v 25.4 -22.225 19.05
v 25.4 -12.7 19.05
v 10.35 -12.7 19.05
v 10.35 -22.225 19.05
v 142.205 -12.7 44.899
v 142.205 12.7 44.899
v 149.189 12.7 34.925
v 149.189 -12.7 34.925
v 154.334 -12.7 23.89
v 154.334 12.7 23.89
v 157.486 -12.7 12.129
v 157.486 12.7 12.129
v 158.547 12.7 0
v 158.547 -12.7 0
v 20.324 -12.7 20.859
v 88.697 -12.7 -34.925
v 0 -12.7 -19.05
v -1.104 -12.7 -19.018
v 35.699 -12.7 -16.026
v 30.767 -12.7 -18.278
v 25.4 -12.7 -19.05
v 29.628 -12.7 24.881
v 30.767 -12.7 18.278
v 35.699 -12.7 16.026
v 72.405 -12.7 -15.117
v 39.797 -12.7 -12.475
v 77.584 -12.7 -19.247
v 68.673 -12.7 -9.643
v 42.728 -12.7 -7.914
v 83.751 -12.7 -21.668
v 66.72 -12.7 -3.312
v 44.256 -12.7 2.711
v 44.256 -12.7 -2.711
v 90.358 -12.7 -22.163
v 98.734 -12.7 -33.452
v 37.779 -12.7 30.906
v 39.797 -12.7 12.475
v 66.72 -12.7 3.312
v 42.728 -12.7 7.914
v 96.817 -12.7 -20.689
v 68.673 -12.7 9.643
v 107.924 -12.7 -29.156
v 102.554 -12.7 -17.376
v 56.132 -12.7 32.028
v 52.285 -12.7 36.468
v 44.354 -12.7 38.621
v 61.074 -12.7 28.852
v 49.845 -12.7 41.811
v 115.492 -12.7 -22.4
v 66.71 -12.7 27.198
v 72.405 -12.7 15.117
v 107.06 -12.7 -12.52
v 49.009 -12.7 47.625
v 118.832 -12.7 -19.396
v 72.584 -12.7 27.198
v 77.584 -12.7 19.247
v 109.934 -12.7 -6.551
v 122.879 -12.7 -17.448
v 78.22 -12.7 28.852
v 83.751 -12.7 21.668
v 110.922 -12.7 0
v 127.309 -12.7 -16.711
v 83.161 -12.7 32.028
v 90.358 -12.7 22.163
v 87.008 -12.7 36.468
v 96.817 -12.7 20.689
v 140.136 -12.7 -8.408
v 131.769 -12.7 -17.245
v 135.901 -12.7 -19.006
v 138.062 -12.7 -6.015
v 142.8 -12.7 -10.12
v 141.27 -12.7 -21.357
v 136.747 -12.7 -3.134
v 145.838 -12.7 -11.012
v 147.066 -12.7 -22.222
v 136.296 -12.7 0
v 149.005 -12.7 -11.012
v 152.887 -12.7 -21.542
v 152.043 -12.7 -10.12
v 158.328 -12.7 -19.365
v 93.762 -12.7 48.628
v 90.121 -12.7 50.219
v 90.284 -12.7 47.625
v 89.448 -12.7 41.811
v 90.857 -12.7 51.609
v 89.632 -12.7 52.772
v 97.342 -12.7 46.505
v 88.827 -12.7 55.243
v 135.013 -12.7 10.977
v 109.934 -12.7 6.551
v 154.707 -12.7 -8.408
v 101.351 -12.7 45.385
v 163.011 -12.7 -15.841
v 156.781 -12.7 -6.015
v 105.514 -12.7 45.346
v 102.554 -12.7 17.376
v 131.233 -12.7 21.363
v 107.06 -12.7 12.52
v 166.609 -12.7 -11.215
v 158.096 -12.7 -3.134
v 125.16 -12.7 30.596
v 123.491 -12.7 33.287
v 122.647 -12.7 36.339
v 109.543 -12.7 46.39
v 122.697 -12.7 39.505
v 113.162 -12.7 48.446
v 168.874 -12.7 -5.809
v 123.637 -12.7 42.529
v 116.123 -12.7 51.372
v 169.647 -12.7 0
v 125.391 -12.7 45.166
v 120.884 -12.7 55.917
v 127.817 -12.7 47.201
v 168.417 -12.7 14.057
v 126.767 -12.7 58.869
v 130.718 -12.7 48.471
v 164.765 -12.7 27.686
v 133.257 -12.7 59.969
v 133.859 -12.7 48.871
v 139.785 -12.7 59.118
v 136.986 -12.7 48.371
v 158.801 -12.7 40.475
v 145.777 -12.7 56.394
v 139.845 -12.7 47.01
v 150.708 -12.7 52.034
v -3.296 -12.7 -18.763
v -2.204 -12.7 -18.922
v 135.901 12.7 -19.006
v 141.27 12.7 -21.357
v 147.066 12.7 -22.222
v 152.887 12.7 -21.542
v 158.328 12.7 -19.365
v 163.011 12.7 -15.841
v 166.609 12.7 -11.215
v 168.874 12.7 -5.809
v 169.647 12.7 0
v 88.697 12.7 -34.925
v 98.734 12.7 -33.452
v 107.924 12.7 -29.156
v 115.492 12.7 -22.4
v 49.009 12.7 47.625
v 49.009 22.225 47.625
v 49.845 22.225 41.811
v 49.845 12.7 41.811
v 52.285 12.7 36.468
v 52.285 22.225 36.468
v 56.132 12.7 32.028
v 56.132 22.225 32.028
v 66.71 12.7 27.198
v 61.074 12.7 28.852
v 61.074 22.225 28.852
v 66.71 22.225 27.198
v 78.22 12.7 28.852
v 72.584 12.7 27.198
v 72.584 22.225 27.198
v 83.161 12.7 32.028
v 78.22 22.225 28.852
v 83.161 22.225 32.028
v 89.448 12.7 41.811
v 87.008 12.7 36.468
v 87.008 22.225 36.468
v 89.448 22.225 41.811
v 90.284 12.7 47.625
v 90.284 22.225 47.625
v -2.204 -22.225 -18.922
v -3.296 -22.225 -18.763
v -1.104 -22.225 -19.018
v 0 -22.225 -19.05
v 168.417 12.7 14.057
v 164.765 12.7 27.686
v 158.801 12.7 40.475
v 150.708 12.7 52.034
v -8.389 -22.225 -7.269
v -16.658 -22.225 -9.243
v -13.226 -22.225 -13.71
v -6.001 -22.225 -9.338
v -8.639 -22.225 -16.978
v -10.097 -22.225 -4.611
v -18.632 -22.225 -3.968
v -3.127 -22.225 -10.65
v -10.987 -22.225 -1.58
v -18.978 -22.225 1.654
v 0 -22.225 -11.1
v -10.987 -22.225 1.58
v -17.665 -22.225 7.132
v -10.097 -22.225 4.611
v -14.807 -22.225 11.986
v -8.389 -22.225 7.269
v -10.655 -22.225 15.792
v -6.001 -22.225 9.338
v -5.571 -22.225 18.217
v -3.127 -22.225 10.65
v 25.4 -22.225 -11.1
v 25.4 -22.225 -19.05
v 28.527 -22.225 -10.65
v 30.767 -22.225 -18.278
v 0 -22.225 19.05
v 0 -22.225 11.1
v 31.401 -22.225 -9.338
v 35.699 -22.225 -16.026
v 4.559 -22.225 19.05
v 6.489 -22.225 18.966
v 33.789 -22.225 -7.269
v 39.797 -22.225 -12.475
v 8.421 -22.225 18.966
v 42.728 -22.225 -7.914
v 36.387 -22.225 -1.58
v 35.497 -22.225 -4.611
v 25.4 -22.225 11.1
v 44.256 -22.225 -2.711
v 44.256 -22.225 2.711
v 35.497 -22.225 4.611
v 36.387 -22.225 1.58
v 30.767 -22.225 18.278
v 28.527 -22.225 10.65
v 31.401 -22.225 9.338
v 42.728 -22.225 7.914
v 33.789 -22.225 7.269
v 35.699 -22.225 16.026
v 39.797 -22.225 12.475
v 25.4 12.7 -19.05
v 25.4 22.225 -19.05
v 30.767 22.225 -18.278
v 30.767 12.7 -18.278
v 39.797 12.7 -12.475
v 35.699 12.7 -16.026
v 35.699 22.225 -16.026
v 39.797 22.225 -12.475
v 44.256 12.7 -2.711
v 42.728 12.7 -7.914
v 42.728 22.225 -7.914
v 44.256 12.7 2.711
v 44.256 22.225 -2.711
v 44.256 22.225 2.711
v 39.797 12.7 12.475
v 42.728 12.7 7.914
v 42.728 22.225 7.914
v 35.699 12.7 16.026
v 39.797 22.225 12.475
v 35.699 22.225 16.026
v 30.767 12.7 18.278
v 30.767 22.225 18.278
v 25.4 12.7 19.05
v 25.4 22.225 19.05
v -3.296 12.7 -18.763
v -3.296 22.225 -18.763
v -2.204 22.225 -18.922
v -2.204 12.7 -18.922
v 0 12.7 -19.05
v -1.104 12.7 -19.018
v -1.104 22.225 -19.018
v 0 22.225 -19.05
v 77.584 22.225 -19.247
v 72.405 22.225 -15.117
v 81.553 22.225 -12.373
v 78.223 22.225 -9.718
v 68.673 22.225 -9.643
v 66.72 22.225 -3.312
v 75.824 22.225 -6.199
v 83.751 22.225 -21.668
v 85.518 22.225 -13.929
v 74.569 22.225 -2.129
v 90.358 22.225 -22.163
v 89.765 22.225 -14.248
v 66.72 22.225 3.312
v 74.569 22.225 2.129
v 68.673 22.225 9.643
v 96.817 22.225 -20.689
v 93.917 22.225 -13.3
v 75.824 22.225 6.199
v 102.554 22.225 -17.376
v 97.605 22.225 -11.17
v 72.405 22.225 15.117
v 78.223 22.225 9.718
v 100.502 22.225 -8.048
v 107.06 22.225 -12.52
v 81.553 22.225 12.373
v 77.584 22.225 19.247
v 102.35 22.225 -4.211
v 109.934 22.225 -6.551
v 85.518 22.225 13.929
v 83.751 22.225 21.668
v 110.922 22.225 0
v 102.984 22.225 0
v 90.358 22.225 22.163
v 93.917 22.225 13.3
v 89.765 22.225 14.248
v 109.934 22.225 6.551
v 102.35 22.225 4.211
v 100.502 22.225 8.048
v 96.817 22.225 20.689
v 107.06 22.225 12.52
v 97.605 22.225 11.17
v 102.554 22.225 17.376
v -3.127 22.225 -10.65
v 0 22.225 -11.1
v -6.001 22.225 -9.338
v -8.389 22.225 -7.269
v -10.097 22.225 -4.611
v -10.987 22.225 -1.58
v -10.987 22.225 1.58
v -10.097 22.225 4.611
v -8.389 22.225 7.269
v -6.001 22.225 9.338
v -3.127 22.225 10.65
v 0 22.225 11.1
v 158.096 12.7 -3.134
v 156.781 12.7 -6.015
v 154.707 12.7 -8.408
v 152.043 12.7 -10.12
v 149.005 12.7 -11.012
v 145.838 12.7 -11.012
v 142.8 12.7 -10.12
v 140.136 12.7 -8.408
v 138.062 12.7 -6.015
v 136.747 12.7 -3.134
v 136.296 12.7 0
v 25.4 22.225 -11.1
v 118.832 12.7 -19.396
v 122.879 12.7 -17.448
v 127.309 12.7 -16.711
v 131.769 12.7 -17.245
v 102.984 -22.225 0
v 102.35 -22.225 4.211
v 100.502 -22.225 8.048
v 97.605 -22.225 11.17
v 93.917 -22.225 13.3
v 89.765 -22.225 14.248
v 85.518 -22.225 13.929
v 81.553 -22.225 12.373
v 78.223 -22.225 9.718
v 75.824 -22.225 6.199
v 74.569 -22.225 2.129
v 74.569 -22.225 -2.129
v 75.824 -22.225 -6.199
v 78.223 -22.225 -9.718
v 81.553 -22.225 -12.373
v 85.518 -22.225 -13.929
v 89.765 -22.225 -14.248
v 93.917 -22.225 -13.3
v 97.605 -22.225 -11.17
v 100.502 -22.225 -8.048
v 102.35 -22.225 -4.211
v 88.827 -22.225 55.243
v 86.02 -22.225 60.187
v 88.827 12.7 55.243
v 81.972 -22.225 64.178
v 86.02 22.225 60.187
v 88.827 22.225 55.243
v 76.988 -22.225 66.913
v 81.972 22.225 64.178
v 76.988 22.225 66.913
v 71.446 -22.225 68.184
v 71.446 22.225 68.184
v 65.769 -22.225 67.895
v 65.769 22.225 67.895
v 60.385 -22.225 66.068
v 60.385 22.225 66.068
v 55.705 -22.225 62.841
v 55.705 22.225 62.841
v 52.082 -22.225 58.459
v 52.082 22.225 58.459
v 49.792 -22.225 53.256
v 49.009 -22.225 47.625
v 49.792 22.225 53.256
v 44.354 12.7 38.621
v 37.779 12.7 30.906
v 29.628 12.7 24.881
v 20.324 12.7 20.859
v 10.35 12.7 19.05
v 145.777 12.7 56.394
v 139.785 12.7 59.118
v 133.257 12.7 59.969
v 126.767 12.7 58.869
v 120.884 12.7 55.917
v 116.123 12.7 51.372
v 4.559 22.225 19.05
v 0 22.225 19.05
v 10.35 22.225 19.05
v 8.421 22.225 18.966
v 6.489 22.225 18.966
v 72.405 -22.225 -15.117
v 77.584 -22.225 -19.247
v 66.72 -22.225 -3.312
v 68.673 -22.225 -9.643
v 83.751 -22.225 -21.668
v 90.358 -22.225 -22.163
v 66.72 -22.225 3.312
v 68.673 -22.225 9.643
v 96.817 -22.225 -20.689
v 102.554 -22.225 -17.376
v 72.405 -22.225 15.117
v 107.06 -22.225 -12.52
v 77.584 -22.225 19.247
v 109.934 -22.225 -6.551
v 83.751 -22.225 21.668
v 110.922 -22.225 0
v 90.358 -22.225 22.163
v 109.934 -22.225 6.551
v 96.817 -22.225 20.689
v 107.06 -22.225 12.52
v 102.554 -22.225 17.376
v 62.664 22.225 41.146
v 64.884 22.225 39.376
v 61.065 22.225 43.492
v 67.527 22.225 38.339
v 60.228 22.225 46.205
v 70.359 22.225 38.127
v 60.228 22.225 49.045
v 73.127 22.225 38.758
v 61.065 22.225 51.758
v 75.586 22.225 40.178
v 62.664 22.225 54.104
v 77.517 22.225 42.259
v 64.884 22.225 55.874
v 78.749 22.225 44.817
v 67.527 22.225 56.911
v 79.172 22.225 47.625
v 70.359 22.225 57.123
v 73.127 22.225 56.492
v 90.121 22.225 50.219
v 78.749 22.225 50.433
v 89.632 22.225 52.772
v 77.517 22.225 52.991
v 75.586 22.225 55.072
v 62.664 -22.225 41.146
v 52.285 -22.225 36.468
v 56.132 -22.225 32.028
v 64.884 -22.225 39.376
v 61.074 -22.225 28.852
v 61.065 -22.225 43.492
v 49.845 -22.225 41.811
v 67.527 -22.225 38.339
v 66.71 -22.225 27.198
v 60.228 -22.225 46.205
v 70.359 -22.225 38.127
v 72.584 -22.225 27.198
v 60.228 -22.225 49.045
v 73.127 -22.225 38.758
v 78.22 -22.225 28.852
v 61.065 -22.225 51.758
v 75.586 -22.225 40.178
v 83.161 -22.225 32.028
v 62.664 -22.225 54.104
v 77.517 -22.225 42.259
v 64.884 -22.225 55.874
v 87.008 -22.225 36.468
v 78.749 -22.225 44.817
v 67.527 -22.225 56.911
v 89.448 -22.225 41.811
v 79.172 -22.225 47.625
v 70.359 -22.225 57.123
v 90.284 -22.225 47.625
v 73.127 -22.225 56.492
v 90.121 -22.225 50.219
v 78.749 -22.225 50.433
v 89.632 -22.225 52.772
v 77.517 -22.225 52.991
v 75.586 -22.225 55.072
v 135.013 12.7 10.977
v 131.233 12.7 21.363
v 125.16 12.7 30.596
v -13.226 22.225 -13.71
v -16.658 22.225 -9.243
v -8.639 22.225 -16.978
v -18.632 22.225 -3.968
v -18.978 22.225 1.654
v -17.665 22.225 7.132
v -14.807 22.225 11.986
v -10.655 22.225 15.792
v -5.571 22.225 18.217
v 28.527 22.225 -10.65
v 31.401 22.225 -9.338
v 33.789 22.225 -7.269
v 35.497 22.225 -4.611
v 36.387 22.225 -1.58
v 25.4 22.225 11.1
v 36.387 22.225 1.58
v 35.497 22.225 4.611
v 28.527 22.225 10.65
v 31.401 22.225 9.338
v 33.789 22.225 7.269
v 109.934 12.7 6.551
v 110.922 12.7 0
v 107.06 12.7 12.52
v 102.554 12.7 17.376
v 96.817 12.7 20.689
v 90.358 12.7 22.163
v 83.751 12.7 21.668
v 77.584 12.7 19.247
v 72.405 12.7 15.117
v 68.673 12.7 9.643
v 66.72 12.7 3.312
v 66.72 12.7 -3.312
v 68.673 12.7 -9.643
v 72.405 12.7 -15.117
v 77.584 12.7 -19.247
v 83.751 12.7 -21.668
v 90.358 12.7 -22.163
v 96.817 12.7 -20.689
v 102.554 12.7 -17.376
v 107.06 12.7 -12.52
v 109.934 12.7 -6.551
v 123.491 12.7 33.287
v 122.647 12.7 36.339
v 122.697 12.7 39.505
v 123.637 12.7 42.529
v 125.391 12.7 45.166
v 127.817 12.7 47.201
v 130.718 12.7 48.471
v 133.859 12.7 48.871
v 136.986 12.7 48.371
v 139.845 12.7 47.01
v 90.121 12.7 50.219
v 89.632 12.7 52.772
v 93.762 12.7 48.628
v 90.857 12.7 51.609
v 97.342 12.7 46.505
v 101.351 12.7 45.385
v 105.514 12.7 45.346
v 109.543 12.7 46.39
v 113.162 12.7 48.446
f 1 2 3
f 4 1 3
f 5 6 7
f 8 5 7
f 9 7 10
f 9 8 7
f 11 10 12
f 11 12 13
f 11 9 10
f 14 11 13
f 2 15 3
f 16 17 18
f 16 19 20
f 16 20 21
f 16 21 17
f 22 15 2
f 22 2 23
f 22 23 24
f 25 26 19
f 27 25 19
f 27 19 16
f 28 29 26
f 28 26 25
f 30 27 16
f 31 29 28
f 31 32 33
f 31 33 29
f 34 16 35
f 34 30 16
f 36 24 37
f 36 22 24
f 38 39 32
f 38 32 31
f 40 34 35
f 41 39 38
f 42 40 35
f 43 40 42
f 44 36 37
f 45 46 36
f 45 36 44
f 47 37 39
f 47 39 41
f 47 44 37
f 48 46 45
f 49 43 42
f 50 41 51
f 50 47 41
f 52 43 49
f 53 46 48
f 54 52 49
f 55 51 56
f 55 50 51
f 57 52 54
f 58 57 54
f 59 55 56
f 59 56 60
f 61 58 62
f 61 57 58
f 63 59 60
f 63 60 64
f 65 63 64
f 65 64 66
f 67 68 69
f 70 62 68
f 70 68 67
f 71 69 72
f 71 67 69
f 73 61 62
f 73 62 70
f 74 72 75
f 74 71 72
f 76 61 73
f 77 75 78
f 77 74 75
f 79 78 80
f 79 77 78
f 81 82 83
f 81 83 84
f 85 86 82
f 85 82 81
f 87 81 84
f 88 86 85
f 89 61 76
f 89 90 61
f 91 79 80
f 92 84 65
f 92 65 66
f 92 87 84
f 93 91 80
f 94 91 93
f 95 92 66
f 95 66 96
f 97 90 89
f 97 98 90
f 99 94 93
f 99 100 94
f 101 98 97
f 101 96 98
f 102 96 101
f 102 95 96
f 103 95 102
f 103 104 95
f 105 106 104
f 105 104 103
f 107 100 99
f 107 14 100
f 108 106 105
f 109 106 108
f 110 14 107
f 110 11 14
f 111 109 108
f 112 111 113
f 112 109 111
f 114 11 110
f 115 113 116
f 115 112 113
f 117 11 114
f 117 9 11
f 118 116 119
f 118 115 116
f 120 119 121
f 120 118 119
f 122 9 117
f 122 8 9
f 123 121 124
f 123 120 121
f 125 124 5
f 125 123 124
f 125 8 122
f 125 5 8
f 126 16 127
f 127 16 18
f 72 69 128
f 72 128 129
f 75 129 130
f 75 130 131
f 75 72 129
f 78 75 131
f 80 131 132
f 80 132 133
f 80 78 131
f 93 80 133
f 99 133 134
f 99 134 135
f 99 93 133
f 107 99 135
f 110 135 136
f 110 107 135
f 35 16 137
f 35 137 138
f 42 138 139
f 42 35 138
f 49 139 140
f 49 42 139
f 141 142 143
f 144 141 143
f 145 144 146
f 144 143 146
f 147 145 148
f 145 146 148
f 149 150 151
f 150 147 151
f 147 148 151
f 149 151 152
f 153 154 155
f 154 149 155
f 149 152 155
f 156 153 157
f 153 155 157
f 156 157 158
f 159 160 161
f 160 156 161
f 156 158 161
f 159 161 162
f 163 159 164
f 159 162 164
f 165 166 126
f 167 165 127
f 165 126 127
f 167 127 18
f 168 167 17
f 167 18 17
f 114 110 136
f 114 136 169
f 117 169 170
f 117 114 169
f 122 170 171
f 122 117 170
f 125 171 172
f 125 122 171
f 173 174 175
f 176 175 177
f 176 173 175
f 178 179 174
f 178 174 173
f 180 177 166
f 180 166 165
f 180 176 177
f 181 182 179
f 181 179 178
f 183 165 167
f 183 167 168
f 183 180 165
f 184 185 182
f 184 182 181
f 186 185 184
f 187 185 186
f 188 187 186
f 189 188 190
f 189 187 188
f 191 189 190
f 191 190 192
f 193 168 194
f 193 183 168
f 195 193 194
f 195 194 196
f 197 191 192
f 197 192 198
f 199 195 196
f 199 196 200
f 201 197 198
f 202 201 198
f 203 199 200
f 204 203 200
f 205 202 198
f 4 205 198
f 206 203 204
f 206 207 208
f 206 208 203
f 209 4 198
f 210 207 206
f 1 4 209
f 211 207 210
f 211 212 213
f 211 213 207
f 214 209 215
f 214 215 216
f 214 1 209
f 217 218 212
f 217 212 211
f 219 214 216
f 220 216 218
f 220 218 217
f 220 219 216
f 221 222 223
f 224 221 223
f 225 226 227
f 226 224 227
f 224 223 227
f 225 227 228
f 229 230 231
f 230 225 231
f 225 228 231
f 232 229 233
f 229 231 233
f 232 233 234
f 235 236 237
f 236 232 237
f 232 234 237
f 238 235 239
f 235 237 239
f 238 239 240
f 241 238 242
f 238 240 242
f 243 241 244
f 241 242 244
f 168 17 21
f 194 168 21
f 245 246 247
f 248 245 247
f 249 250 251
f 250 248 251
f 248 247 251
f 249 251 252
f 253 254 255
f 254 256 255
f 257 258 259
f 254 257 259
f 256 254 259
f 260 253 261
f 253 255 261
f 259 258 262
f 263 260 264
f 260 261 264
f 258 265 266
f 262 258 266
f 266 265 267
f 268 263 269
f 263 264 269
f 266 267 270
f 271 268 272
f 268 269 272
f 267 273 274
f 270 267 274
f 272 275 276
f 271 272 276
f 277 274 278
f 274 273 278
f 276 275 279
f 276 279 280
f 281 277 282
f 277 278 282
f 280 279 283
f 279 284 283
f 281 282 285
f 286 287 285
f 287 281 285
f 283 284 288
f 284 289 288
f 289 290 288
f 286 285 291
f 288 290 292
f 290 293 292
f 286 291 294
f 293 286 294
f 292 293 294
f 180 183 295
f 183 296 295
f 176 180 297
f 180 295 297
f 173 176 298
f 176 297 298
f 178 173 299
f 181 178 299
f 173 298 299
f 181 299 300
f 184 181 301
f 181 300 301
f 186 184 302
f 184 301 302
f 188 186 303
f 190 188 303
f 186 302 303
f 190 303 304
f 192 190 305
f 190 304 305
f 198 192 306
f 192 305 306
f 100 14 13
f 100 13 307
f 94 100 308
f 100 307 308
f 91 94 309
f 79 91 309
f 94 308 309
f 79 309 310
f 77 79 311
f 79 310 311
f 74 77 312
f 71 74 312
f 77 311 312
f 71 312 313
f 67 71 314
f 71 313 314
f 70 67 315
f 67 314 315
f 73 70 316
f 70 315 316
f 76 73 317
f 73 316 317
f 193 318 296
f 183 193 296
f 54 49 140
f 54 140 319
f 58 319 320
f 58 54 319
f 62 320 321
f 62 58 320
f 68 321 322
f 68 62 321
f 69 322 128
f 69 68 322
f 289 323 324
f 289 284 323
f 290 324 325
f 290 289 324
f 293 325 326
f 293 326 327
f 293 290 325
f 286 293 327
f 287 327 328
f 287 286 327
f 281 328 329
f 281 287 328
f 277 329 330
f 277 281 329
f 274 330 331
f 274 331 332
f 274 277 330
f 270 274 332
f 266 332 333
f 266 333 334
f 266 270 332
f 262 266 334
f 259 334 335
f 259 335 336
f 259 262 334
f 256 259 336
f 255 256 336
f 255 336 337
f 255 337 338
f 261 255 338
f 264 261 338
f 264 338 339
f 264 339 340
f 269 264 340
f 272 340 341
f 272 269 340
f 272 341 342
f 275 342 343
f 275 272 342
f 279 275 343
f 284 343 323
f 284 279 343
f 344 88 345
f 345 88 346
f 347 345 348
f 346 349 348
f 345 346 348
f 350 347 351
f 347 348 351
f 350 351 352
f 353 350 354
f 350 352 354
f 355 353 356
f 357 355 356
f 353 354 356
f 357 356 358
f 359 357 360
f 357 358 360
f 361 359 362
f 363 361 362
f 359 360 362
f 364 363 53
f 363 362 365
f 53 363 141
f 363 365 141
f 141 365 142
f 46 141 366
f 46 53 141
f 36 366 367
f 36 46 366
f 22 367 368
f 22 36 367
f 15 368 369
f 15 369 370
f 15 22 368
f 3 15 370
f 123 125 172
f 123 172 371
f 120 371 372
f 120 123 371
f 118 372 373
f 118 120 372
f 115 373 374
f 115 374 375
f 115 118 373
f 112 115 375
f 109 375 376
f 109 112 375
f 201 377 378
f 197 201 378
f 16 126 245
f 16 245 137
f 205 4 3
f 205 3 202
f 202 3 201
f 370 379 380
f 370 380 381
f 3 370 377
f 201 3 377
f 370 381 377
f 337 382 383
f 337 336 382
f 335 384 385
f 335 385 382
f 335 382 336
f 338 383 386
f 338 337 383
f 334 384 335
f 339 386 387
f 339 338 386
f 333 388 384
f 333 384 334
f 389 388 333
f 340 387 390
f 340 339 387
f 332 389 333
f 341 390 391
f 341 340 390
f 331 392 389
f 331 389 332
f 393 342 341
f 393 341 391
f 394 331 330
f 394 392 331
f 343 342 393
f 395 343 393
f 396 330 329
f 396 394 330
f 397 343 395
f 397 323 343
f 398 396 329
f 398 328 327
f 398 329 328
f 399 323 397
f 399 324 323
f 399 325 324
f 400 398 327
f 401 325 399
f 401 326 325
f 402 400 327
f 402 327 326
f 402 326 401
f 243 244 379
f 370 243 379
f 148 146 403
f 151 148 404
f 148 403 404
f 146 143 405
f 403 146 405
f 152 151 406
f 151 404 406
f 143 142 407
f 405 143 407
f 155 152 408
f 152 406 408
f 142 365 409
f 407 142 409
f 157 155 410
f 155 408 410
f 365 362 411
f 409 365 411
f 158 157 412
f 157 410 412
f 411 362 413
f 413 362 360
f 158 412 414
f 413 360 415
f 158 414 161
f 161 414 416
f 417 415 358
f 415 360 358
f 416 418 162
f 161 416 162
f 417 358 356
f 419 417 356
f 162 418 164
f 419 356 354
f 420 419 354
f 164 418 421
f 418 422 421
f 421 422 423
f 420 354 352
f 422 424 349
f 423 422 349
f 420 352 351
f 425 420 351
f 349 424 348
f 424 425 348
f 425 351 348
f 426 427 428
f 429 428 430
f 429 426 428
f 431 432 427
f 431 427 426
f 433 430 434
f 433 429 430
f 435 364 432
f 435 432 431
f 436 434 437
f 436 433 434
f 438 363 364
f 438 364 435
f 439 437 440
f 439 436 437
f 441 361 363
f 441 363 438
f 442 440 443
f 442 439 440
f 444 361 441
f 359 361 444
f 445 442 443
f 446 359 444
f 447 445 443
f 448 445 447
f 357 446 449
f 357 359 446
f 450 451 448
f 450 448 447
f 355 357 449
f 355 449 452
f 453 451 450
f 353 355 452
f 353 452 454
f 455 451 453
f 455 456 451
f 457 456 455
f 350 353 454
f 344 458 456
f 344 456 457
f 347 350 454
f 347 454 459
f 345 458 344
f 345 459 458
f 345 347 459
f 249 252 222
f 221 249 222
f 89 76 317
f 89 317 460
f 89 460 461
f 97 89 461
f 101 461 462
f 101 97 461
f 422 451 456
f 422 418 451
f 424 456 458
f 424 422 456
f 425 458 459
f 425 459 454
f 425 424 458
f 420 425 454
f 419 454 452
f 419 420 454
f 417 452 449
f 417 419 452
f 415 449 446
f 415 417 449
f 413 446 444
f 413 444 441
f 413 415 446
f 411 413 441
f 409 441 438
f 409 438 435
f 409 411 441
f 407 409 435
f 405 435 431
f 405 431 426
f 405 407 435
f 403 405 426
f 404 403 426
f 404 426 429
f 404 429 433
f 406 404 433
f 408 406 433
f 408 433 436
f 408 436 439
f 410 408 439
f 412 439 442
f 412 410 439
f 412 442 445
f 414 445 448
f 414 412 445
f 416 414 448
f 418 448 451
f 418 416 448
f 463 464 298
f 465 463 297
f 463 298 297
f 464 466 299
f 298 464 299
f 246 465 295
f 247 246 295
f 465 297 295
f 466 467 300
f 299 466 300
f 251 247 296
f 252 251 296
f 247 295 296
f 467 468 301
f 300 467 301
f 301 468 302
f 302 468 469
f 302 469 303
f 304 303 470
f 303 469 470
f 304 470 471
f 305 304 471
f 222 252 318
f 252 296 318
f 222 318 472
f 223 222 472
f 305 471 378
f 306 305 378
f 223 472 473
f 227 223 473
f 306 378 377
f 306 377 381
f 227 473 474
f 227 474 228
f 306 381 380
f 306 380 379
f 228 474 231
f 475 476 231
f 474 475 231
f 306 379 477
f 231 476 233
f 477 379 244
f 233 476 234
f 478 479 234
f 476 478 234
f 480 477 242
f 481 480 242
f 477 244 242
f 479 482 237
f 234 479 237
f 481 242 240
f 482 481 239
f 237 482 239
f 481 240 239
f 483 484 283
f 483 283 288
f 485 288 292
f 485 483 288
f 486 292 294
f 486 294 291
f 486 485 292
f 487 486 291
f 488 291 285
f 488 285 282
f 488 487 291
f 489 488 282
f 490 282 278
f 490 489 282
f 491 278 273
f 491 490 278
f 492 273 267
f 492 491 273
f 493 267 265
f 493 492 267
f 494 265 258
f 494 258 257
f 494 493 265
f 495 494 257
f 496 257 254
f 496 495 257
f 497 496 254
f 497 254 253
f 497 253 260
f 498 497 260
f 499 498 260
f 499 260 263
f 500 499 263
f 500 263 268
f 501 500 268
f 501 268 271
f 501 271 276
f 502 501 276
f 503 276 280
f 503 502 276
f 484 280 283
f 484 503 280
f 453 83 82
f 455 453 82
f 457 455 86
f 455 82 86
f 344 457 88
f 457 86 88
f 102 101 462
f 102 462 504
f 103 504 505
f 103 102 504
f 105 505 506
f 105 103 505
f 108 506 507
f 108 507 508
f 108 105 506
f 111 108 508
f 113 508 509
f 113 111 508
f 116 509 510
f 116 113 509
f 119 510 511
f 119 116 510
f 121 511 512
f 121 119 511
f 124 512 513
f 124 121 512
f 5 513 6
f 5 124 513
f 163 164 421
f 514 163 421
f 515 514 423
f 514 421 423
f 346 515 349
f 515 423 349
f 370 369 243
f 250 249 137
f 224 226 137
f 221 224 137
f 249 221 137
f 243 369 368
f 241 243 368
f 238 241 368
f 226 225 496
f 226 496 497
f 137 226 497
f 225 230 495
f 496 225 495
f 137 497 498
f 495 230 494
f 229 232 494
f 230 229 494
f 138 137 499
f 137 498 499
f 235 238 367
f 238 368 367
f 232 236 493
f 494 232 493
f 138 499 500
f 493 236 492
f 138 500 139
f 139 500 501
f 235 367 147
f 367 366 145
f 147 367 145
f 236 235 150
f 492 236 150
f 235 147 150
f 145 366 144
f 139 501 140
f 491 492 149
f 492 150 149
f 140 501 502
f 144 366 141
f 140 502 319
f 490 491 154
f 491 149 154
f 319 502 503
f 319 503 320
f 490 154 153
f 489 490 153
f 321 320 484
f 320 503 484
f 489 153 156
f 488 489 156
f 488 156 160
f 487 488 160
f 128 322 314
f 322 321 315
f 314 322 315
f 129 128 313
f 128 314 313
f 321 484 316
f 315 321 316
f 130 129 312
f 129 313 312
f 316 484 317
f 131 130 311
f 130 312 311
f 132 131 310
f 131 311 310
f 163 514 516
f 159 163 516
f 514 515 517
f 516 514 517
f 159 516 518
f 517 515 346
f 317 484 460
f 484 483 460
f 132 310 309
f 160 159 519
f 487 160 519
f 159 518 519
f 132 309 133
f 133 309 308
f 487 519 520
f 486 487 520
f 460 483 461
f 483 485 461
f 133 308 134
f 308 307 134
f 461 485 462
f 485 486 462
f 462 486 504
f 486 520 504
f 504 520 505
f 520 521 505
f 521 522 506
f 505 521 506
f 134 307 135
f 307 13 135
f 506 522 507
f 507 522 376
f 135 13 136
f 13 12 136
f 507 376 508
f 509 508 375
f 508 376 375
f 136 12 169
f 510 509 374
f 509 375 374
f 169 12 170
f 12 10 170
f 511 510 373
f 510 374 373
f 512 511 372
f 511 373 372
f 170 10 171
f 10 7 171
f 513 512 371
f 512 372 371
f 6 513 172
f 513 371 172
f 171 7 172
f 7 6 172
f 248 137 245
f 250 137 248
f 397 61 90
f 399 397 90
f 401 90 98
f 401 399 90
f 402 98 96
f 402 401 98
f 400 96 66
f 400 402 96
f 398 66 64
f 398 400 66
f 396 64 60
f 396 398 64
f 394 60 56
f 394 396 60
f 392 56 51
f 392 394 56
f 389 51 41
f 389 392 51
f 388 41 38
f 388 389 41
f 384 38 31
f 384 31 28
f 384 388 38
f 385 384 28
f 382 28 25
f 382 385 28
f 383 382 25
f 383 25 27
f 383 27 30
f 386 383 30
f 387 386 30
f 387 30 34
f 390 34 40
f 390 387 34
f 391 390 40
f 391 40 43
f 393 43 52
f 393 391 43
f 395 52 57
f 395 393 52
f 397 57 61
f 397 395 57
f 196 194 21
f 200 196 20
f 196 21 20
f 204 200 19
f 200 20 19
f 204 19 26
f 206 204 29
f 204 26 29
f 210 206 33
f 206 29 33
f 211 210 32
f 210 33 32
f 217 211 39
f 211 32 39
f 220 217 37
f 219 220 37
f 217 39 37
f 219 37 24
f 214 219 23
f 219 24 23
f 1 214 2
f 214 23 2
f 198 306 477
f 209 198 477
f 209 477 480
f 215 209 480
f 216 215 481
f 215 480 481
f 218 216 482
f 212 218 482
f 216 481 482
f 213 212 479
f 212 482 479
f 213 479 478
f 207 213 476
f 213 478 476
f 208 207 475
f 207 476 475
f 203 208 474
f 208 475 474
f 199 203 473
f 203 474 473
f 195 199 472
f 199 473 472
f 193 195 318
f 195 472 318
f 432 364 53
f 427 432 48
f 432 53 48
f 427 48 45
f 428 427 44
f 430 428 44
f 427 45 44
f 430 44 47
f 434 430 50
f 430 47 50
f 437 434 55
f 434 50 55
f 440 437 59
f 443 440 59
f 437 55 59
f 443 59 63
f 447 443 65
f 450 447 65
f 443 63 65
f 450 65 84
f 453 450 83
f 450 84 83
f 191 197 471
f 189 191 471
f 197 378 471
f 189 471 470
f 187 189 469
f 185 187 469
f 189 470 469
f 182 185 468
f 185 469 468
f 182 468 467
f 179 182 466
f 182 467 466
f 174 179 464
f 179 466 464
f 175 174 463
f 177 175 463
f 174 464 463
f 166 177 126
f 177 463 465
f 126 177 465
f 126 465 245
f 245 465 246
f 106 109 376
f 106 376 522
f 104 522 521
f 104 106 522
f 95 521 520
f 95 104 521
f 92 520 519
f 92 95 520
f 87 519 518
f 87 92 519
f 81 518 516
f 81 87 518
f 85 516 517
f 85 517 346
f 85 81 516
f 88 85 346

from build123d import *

# Parameters (mm, degrees)
F0_R     = 22.225
F1_DEPTH = 12.7
F0_R_2   = 9.525
F0_R_3   = 14.2875
F2_DEPTH = 22.225


with BuildPart() as f1:
    # F0 (on Front) → F1 (new body, symmetric)
    with BuildSketch(Plane.XZ):
        with BuildLine():
            ThreePointArc((0, -19.05), (-1.654463, -18.97802), (-3.296423, -18.762625))
            Line((-3.296423, -18.762625), (88.6968, -34.925))
            ThreePointArc((88.6968, -34.925), (103.485961, -31.639158), (115.492311, -22.399915))
            ThreePointArc((115.492311, -22.399915), (125.067877, -16.921755), (135.901052, -19.005989))
            ThreePointArc((135.901052, -19.005989), (158.328168, -19.36485), (169.6466, 0))
            ThreePointArc((169.6466, 0), (164.76473, 27.686462), (150.707944, 52.033528))
            ThreePointArc((150.707944, 52.033528), (133.25733, 59.968505), (116.123111, 51.371624))
            ThreePointArc((116.123111, 51.371624), (101.35138, 45.385387), (88.826782, 55.24305))
            ThreePointArc((88.826782, 55.24305), (89.916646, 51.503113), (90.2843, 47.625))
            ThreePointArc((90.2843, 47.625), (69.6468, 26.9875), (49.0093, 47.625))
            ThreePointArc((49.0093, 47.625), (33.876078, 27.660393), (10.350325, 19.05))
            Line((10.350325, 19.05), (25.4, 19.05))
            ThreePointArc((25.4, 19.05), (44.45, 0), (25.4, -19.05))
            Line((25.4, -19.05), (0, -19.05))
        make_face()
        with Locations((88.6968, 0)):
            Circle(F0_R, mode=Mode.SUBTRACT)
        with BuildLine():
            ThreePointArc((158.5468, 0), (147.4216, -11.1252), (136.2964, 0))
            ThreePointArc((136.2964, 0), (133.425793, 16.280022), (125.160209, 30.596433))
            ThreePointArc((125.160209, 30.596433), (126.531466, 46.269971), (142.205004, 44.898715))
            ThreePointArc((142.205004, 44.898715), (154.33433, 23.890107), (158.5468, 0))
        make_face(mode=Mode.SUBTRACT)
    extrude(amount=F1_DEPTH, both=True)

    # F0 (on Front) → F2 (join, symmetric)
    with BuildSketch(Plane.XZ):
        with BuildLine():
            Line((4.5593, 19.05), (0, 19.05))
            ThreePointArc((0, 19.05), (-18.97802, 1.654463), (-3.296423, -18.762625))
            ThreePointArc((-3.296423, -18.762625), (-1.654463, -18.97802), (0, -19.05))
            Line((0, -19.05), (25.4, -19.05))
            ThreePointArc((25.4, -19.05), (44.45, 0), (25.4, 19.05))
            Line((25.4, 19.05), (10.350325, 19.05))
            ThreePointArc((10.350325, 19.05), (7.454813, 18.955592), (4.5593, 19.05))
        make_face()
        with BuildLine():
            ThreePointArc((0, -11.0998), (-11.0998, 0), (0, 11.0998))
            Line((0, 11.0998), (25.4, 11.0998))
            ThreePointArc((25.4, 11.0998), (36.4998, 0), (25.4, -11.0998))
            Line((25.4, -11.0998), (0, -11.0998))
        make_face(mode=Mode.SUBTRACT)
        with BuildLine():
            ThreePointArc((88.826782, 55.24305), (65.768687, 67.894846), (49.0093, 47.625))
            ThreePointArc((49.0093, 47.625), (69.6468, 26.9875), (90.2843, 47.625))
            ThreePointArc((90.2843, 47.625), (89.916646, 51.503113), (88.826782, 55.24305))
        make_face()
        with Locations((69.6468, 47.625)):
            Circle(F0_R_2, mode=Mode.SUBTRACT)
        with Locations((88.6968, 0)):
            Circle(F0_R)
        with Locations((88.6968, 0)):
            Circle(F0_R_3, mode=Mode.SUBTRACT)
    extrude(amount=F2_DEPTH, both=True)


solid = f1.part
